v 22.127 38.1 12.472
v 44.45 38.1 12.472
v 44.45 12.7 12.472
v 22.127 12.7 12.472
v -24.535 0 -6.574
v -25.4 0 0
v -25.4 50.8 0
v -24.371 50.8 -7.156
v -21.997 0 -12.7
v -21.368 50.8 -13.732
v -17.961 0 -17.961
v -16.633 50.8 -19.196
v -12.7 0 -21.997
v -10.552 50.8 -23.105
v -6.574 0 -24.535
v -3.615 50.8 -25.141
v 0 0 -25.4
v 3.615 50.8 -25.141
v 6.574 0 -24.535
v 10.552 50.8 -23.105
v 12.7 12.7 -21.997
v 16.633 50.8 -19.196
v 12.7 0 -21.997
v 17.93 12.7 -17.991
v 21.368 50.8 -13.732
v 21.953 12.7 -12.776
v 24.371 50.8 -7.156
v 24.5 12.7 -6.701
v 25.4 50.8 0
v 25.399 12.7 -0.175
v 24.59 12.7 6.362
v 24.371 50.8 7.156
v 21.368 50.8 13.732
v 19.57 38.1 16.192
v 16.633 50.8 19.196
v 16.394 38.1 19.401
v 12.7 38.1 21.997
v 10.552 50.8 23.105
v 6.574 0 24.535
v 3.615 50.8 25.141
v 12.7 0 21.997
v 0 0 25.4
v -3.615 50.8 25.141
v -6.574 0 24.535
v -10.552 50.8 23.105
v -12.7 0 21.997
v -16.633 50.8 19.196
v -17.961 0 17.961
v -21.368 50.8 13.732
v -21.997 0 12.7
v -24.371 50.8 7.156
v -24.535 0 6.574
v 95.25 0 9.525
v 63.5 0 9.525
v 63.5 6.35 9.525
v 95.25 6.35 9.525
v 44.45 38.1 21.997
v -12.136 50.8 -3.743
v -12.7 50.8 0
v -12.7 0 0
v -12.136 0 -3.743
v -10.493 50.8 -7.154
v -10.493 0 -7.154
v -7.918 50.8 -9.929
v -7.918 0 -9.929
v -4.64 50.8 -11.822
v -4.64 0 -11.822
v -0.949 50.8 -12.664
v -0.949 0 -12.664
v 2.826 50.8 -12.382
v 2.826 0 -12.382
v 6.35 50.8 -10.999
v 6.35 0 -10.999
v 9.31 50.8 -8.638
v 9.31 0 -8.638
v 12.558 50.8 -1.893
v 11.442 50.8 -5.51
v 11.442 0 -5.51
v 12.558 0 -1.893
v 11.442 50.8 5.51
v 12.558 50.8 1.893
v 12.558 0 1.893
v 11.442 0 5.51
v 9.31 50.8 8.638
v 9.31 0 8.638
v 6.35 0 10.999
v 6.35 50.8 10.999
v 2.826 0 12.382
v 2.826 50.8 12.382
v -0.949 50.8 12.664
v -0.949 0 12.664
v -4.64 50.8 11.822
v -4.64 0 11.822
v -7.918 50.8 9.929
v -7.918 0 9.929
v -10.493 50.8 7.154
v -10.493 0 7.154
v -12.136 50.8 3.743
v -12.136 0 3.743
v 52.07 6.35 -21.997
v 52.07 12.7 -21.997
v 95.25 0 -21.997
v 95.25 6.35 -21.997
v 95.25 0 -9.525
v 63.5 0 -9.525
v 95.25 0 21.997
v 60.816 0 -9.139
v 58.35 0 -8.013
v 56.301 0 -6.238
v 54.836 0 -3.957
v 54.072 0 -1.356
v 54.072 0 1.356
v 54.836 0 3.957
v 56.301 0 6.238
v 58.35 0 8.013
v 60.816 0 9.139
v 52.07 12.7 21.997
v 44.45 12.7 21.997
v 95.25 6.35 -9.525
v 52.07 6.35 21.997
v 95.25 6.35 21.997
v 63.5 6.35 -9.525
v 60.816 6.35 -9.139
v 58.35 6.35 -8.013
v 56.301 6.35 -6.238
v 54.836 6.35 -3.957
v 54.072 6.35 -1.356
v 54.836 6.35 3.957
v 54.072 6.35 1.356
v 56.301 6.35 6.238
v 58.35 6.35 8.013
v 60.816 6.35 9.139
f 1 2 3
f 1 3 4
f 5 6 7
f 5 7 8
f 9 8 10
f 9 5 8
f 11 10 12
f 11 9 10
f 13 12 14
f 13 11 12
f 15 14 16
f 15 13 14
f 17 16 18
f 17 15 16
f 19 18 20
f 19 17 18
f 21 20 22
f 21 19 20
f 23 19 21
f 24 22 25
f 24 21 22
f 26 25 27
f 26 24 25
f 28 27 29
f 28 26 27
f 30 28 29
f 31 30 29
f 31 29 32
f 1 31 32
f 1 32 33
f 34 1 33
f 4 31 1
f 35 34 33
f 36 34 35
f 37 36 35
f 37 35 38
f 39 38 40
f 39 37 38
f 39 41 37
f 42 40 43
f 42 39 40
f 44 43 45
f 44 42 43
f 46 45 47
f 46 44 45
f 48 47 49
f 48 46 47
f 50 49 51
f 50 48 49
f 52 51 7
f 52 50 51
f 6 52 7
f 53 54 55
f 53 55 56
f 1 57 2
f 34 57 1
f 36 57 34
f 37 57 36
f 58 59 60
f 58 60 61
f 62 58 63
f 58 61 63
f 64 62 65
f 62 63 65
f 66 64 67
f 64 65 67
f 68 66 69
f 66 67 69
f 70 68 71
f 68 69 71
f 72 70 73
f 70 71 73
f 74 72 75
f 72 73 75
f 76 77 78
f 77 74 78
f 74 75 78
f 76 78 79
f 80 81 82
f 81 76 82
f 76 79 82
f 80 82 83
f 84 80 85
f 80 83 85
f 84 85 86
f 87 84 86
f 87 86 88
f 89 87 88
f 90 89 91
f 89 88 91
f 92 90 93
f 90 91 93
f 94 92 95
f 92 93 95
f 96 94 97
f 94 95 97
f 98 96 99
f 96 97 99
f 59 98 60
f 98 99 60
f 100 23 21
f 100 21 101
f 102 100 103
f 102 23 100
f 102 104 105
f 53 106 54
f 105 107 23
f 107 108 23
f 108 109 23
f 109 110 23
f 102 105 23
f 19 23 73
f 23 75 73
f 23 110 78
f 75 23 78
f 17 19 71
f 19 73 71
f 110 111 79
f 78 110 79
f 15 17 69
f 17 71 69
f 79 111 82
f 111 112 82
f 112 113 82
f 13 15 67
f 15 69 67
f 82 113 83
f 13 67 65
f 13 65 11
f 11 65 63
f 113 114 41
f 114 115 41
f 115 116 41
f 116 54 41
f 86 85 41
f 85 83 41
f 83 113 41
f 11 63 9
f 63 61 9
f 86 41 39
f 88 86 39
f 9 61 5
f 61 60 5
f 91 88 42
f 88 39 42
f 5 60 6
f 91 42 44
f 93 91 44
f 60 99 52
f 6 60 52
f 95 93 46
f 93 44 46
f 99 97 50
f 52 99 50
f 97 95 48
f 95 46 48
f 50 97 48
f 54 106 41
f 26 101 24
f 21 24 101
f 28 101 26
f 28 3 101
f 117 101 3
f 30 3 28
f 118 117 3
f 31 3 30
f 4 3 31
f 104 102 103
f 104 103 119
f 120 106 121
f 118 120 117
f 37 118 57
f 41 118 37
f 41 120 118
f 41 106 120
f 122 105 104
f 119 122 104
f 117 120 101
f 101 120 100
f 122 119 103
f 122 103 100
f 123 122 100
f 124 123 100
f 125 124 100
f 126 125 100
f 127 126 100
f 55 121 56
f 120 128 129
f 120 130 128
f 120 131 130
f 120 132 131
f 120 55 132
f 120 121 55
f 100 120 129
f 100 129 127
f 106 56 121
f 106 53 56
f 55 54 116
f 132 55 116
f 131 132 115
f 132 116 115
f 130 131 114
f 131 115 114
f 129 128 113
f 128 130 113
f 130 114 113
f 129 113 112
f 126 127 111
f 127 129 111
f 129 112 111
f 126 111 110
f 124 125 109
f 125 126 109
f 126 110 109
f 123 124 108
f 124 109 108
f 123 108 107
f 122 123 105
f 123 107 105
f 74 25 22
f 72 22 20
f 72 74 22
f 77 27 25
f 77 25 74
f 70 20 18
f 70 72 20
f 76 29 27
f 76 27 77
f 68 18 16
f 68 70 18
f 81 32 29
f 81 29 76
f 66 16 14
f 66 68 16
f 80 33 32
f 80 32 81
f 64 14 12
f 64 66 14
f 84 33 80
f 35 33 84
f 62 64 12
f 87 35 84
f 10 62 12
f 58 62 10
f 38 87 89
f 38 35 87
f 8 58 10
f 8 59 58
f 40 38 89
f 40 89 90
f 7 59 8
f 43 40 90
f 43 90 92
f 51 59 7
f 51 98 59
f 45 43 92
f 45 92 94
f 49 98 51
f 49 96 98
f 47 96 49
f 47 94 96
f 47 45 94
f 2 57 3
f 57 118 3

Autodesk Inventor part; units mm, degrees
ref_plane "YZ Plane" through (0, 0, 0) normal (1, 0, 0) x (0, 1, 0)
ref_plane "XZ Plane" through (0, 0, 0) normal (0, 1, 0) x (-1, 0, 0)
ref_plane "XY Plane" through (0, 0, 0) normal (0, 0, 1) x (1, 0, 0)
sketch "Sketch1" plane through (0, 0, 0) normal (0, 1, 0) x (-1, 0, 0)
  circle A0 centre (0, 0) radius 12.7
  circle A1 centre (0, 0) radius 25.4
  line L0 (-12.7, -21.997) -> (-95.25, -21.997)
  line L1 (-95.25, 21.997) -> (-12.7, 21.997)
  arc A2 (-63.5, -9.525) -> (-63.5, 9.525) centre (-63.5, 0) ccw
  line L2 (-63.5, 9.525) -> (-95.25, 9.525)
  line L3 (-78.5703, 0) -> (-63.5, 0) construction
  line L4 (-63.5, -9.525) -> (-95.25, -9.525)
  line L5 (-95.25, -21.997) -> (-95.25, -9.525)
  line L6 (-95.25, 9.525) -> (-95.25, 21.997)
  line L7 (-44.45, 21.997) -> (-44.45, 12.472)
  line L8 (-44.45, 12.472) -> (-22.1271, 12.472)
  line L9 (-52.07, 21.997) -> (-52.07, -21.997)
  dimension "d0" = 25.4
  dimension "d3" = 19.05
  dimension "d4" = 31.75
  dimension "d5" = 12.7
  dimension "d6" = 44.45
  dimension "d7" = 9.525
  dimension "d8" = 7.62
  dimension "d9" = 82.55
  dimension "d10" = 12.7
extrude "Extrusion3" add sketch "Sketch1" along normal blind 50.8 contours A1
extrude "Extrusion4" add sketch "Sketch1" along normal blind 6.35 contours A1 L8 L7 L1 | L0 L9 L1 L7 L8 A1 | L0 L5 L4 A2 L2 L6 L1 L9
extrude "Extrusion5" add sketch "Sketch1" along normal blind 6.35 from surface at 6.35 contours A1 L8 L7 L1 | L0 L9 L1 L7 L8 A1
extrude "Extrusion6" add sketch "Sketch1" along normal blind 25.4 from surface at 12.7 contours A1 L8 L7 L1
properties part number "Distance from Face Complete"
